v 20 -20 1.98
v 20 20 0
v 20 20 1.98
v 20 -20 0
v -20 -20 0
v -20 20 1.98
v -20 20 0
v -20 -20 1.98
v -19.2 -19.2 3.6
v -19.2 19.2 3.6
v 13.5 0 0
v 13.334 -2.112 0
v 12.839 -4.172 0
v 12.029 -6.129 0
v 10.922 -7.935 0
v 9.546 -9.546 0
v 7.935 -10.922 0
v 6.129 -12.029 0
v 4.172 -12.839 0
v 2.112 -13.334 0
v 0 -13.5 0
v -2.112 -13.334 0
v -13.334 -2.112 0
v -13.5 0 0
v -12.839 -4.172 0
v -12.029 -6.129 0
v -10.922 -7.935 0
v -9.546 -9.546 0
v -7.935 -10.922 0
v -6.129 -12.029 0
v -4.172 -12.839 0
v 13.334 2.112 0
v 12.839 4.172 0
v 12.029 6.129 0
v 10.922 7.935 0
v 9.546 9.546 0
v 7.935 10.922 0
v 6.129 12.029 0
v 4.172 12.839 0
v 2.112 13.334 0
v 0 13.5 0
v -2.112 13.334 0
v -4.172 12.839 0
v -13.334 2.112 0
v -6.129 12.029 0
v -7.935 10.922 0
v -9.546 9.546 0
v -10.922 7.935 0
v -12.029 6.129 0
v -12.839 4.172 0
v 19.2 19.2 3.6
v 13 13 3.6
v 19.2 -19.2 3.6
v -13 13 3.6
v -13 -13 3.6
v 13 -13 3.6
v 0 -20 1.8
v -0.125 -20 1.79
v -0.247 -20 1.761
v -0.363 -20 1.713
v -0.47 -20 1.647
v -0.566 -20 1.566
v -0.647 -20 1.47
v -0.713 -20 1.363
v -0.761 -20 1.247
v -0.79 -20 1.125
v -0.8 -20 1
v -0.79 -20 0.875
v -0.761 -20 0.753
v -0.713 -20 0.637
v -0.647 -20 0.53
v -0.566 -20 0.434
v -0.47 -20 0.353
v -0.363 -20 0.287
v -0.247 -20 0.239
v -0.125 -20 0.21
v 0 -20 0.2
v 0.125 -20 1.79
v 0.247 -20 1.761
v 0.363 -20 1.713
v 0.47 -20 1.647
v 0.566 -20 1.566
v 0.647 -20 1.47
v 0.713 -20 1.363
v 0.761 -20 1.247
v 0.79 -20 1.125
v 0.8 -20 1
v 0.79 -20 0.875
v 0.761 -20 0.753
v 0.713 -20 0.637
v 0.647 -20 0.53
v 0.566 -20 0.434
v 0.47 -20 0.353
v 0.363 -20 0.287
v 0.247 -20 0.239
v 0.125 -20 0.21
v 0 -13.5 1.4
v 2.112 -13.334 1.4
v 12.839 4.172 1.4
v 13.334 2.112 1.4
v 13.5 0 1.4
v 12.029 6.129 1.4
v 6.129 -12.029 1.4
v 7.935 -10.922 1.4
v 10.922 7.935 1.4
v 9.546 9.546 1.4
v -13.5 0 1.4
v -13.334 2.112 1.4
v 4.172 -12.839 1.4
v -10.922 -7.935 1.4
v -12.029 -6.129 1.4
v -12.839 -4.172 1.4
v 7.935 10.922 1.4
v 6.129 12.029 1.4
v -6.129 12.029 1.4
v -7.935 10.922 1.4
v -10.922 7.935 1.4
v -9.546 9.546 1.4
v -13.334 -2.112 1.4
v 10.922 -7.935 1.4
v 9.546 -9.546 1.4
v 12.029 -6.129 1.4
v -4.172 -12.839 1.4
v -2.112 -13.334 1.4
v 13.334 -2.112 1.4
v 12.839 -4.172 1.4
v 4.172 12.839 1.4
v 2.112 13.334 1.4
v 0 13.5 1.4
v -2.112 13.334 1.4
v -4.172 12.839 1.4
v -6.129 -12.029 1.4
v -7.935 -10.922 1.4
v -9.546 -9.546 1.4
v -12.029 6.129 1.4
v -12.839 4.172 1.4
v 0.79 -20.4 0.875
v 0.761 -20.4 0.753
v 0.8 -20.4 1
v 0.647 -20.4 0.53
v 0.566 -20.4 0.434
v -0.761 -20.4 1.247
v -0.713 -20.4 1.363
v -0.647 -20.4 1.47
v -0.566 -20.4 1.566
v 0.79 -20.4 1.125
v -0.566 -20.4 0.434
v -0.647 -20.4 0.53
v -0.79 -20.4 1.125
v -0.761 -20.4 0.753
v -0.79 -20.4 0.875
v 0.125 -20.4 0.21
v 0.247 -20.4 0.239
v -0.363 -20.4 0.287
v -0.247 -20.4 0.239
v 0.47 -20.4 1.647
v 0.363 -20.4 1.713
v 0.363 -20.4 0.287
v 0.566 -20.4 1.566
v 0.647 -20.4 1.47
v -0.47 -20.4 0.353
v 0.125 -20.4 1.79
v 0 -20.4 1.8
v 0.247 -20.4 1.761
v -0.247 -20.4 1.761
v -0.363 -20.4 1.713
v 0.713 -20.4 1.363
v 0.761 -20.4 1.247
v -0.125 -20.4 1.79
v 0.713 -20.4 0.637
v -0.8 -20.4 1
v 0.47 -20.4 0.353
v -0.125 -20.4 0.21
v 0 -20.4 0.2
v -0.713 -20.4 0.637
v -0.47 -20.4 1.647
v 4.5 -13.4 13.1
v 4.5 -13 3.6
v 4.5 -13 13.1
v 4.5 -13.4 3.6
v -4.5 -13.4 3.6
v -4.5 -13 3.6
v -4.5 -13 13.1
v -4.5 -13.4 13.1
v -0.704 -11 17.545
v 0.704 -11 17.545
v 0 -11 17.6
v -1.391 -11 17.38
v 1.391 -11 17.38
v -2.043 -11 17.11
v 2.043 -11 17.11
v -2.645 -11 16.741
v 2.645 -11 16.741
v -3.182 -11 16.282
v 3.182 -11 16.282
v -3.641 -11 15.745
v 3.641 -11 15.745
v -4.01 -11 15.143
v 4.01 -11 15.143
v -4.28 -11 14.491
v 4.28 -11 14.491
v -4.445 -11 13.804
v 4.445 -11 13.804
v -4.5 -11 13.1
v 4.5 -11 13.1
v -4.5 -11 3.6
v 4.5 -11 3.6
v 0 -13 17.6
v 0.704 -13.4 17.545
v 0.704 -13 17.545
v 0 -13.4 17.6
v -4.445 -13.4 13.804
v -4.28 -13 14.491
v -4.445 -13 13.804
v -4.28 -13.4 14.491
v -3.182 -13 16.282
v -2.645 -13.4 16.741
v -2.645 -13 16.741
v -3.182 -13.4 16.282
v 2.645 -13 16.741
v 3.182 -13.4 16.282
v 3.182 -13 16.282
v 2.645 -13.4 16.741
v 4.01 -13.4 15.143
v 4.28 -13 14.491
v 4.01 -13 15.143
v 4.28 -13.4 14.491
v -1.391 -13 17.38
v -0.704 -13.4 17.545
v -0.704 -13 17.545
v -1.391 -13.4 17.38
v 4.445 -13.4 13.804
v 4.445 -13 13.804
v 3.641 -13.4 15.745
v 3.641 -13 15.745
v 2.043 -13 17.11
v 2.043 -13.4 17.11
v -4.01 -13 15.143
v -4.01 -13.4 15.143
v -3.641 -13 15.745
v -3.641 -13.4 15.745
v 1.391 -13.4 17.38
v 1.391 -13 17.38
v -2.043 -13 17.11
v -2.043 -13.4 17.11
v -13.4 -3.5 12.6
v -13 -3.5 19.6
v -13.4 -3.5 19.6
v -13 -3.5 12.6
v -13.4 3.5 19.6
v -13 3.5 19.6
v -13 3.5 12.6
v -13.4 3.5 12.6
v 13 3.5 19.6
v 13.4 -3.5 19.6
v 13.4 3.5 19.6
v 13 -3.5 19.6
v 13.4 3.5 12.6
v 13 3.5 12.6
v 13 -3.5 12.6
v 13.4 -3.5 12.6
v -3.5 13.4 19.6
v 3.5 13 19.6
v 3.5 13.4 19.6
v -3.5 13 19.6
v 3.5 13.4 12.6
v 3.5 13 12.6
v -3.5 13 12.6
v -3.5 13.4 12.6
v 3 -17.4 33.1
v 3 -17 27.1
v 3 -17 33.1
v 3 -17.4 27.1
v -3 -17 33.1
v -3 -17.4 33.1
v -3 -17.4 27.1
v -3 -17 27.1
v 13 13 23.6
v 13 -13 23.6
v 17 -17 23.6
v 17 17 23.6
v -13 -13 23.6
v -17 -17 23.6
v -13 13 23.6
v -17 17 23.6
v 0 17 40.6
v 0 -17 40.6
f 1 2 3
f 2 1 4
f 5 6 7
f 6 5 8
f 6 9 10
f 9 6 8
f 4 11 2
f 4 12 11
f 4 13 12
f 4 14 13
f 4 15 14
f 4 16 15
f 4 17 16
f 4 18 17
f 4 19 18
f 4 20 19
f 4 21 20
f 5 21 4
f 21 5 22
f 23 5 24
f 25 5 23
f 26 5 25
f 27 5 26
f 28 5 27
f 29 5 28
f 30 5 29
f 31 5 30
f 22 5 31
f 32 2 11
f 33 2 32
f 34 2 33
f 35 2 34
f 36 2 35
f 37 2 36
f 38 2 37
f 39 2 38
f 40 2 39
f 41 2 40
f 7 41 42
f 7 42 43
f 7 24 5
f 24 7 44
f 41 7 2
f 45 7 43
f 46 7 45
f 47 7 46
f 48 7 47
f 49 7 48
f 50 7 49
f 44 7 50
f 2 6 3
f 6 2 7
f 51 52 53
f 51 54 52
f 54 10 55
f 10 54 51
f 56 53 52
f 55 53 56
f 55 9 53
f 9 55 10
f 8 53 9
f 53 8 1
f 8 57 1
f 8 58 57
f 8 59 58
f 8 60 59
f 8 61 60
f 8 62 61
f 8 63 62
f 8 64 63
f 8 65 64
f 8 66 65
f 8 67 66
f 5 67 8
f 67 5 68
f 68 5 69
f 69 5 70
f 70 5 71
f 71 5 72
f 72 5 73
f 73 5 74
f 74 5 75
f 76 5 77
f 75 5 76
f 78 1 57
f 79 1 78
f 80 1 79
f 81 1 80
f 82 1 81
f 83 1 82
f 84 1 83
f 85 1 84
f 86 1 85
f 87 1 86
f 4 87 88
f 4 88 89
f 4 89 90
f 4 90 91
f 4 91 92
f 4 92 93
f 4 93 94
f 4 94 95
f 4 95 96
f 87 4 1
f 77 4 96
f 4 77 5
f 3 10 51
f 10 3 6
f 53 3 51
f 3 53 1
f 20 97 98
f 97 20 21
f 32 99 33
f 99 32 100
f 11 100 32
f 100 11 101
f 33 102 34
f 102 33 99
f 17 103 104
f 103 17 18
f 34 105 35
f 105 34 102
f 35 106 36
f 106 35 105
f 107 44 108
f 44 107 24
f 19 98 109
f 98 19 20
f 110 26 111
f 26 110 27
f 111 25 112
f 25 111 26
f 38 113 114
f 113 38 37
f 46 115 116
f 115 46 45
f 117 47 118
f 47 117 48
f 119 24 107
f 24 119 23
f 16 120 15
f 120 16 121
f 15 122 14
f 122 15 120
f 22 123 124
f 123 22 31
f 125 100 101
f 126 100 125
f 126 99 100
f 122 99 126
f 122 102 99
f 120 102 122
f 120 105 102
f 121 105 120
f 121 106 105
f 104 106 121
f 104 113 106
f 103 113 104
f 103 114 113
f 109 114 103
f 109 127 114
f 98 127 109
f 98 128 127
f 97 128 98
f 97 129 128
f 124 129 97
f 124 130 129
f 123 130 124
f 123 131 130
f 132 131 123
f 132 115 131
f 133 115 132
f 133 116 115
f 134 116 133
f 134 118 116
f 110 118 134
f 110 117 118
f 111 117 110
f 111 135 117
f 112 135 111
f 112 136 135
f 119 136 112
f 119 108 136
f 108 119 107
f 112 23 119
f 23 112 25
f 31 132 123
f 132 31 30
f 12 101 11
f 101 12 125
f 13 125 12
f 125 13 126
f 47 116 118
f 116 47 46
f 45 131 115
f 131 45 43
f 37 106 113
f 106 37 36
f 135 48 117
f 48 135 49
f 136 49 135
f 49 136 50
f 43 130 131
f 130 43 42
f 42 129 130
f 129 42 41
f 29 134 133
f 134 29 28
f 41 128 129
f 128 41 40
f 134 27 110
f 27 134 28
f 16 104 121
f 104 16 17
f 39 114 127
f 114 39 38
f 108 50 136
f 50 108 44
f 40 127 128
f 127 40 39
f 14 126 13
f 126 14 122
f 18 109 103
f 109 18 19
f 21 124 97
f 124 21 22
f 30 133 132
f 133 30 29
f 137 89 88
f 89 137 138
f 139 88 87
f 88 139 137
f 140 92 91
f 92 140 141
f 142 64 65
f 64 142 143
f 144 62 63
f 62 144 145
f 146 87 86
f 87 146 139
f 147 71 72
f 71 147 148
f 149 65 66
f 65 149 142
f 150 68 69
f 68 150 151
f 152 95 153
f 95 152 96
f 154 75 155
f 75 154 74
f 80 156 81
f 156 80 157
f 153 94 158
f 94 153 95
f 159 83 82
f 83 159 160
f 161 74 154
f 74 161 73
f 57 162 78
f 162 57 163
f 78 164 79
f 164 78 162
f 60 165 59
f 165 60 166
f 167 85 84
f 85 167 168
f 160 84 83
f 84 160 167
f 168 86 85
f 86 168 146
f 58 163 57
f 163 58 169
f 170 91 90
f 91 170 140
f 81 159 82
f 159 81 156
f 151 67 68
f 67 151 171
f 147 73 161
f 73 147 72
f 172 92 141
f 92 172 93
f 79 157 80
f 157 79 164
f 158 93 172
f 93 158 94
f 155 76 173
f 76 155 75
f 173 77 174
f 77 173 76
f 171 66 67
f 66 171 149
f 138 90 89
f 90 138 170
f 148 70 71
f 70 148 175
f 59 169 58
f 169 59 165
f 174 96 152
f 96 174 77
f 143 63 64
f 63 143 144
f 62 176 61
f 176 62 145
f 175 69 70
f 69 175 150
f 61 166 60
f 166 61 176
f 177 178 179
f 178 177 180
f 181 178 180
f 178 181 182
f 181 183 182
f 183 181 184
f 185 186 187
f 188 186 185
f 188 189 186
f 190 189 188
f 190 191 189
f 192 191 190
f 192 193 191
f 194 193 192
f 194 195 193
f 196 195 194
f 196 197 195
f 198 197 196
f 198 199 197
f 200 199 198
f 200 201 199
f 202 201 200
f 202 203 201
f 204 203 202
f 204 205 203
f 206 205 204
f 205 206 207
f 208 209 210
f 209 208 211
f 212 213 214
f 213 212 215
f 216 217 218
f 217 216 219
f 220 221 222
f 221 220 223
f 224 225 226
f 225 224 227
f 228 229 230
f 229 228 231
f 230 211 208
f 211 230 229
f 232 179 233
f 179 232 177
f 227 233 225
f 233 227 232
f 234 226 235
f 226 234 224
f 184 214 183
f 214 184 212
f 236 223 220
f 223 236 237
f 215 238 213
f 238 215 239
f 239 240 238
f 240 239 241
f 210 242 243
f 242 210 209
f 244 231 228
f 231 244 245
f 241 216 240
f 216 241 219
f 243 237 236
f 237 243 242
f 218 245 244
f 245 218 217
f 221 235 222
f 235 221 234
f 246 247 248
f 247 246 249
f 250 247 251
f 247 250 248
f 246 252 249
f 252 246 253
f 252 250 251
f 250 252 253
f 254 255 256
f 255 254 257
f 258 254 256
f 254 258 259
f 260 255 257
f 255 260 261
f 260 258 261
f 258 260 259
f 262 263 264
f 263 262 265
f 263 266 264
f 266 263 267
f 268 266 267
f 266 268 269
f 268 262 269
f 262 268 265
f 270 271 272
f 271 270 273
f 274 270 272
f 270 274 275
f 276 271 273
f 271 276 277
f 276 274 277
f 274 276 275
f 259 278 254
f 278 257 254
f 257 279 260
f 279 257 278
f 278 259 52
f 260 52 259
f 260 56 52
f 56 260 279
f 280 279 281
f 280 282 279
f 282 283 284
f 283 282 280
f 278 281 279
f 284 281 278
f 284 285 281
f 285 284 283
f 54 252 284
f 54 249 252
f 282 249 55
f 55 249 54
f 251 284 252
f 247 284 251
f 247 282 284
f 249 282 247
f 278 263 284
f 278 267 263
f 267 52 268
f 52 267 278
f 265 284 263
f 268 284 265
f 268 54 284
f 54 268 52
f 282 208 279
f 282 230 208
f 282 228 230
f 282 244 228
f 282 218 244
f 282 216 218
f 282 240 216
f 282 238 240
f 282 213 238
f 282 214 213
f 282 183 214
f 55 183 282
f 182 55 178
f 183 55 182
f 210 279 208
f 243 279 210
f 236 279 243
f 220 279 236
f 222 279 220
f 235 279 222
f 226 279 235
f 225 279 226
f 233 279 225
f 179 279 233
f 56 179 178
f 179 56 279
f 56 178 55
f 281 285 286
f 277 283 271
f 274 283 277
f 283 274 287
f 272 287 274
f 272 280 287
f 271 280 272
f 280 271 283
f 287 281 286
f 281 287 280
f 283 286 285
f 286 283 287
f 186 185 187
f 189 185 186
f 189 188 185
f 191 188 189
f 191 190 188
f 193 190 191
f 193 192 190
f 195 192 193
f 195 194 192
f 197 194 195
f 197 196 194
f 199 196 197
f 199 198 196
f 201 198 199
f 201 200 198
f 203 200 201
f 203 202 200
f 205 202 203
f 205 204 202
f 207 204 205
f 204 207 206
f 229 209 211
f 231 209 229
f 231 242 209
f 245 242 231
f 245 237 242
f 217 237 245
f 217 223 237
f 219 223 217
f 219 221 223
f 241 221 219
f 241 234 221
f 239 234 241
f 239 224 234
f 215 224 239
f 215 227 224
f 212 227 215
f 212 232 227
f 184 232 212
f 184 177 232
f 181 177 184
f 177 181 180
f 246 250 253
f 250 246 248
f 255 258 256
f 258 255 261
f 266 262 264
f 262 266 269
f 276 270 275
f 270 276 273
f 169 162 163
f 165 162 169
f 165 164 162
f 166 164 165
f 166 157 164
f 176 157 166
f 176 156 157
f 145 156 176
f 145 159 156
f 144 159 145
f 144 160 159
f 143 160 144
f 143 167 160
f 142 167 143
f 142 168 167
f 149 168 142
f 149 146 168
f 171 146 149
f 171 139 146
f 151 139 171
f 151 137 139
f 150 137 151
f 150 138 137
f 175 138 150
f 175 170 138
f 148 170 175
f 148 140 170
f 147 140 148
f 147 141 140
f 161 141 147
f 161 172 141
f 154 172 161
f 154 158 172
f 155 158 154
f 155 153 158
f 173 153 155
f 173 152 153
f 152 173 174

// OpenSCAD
// file: lib.scad
// BDL Pets - gemeinsame Bausteine fuer die 5 Haus-Stufen
//
// Alle Haeuser sind in genau 4 Farbslots aufgeteilt (Multicolor-Druck, z.B. Bambu AMS / Prusa MMU):
//   1 Stein/Sockel   2 Waende   3 Dach   4 Akzente (Tueren, Fenster, Pfosten, Stufen-Punkte)
// Die Teile ueberlappen nicht (Oeffnungen werden aus der einen Farbe geschnitten und in der anderen gefuellt),
// jeder Farbslot laesst sich einzeln als STL exportieren:  openscad -D part=1 -o x_c1.stl house-1-huette.scad
//   part = 0 -> Vorschau in Farbe, 1..4 -> nur dieser Farbslot
//
// Unten (Sockel) ist mittig eine runde Ausnehmung fuer einen NFC-Sticker (Durchmesser 25 mm) ausgespart:
// Sticker von unten einkleben, buendig mit der Unterseite, 2.2 mm Kunststoff darueber (Lesen durch das Haus).

$fn = 40;

PH = 3.6;           // Sockelhoehe (mm)
NFC_D = 27;         // Ausnehmung: 25 mm Sticker + Spiel
NFC_DEPTH = 1.4;    // Tiefe von unten (NTAG-Sticker ~0.3-0.6 mm dick + Kleber) -> Restdecke = PH - NFC_DEPTH
PALETTE = ["#8c9097", "#eadfc4", "#a5432f", "#33415f"];

module pc(i, part) {
    if (part == 0) color(PALETTE[i - 1]) children();
    else if (part == i) children();
}

// ---------------------------------------------------------------- Sockel (Farbe 1)
module plinth(w, d, tier) {
    difference() {
        hull() {
            translate([-w / 2, -d / 2, 0]) cube([w, d, PH * 0.55]);
            translate([-w / 2 + 0.8, -d / 2 + 0.8, 0]) cube([w - 1.6, d - 1.6, PH]);
        }
        translate([0, 0, -0.01]) cylinder(d = NFC_D, h = NFC_DEPTH + 0.01);   // NFC-Sticker
        tier_dots(w, d, tier, false);
    }
}

// Stufen-Punkte an der Sockel-Vorderseite: 1 Punkt = Huette ... 5 Punkte = Villa (Farbe 4 fuellt sie)
module tier_dots(w, d, tier, fill) {
    for (i = [0 : tier])
        translate([(i - tier / 2) * 4.5, -d / 2 - (fill ? 0.4 : 1), 1.0])
            rotate([-90, 0, 0]) cylinder(d = 1.6, h = fill ? 1.4 : 2);
}

// ---------------------------------------------------------------- Koerper
module box(w, d, h, z0, cx = 0, cy = 0) {
    translate([cx - w / 2, cy - d / 2, z0]) cube([w, d, h]);
}

// Satteldach, First entlang Y (Giebel zeigt nach vorn)
module gable(w, d, h, z0, over, cx = 0, cy = 0) {
    translate([cx, cy + (d + 2 * over) / 2, z0]) rotate([90, 0, 0])
        linear_extrude(d + 2 * over) polygon([[-w / 2 - over, 0], [w / 2 + over, 0], [0, h]]);
}

// Walmdach, First entlang X
module hip(w, d, h, z0, over, ridge, cx = 0, cy = 0) {
    hull() {
        translate([cx - w / 2 - over, cy - d / 2 - over, z0]) cube([w + 2 * over, d + 2 * over, 0.01]);
        translate([cx - ridge / 2, cy - 0.4, z0 + h - 0.01]) cube([ridge, 0.8, 0.01]);
    }
}

// ---------------------------------------------------------------- Oeffnungen (Tueren/Fenster)
// Ursprung = Unterkante Mitte, ragt von der Wandflaeche (y=0) nach innen (+y).
// fill=false: Schneidkoerper (steht 1 mm ueber), fill=true: Einsatz aus Farbe 4 (steht 0.4 mm vor)
module opening(w, h, d = 2, arch = false, fill = false) {
    out = fill ? 0.4 : 1;
    translate([0, -out, 0]) {
        if (arch) {
            translate([-w / 2, 0, 0]) cube([w, out + d, h - w / 2]);
            translate([0, 0, h - w / 2]) rotate([-90, 0, 0]) cylinder(d = w, h = out + d);
        } else {
            translate([-w / 2, 0, 0]) cube([w, out + d, h]);
        }
    }
}

// Auf eine Wand setzen. `face` = Abstand der Wandflaeche von der Mitte
module on_front(x, z, face) { translate([x, -face, z]) children(); }
module on_back(x, z, face) { translate([x, face, z]) rotate([0, 0, 180]) children(); }
module on_left(y, z, face) { translate([-face, y, z]) rotate([0, 0, -90]) children(); }
module on_right(y, z, face) { translate([face, y, z]) rotate([0, 0, 90]) children(); }

module on_side(k, y, z, face) {   // k = 0 links, 1 rechts
    if (k == 0) on_left(y, z, face) children();
    else on_right(y, z, face) children();
}
// main file
// Stufe 1: Huette - 1 Platz, Zufriedenheit -40/Tag. Kleiner Holzbau, steiles Strohdach.
include <lib.scad>

H1_P = [40, 40];
H1_W = 26; H1_D = 26; H1_H = 20; H1_RH = 17; H1_OV = 4;

module h1_openings(fill) {
    z = PH;
    on_front(0, z, H1_D / 2) opening(9, 14, 2, true, fill);
    for (k = [0, 1]) on_side(k, 0, z + 9, H1_W / 2) opening(7, 7, 2, false, fill);
    on_back(0, z + 9, H1_D / 2) opening(7, 7, 2, false, fill);
    // Giebelfenster im Dach
    on_front(0, z + H1_H + 3.5, H1_D / 2 + H1_OV) opening(6, 6, 2.5, false, fill);
}

module house1(part = 0) {
    pc(1, part) plinth(H1_P[0], H1_P[1], 0);
    pc(2, part) difference() { box(H1_W, H1_D, H1_H, PH); h1_openings(false); }
    pc(3, part) difference() { gable(H1_W, H1_D, H1_RH, PH + H1_H, H1_OV); h1_openings(false); }
    pc(4, part) { h1_openings(true); tier_dots(H1_P[0], H1_P[1], 0, true); }
}

part = 0;
house1(part);
